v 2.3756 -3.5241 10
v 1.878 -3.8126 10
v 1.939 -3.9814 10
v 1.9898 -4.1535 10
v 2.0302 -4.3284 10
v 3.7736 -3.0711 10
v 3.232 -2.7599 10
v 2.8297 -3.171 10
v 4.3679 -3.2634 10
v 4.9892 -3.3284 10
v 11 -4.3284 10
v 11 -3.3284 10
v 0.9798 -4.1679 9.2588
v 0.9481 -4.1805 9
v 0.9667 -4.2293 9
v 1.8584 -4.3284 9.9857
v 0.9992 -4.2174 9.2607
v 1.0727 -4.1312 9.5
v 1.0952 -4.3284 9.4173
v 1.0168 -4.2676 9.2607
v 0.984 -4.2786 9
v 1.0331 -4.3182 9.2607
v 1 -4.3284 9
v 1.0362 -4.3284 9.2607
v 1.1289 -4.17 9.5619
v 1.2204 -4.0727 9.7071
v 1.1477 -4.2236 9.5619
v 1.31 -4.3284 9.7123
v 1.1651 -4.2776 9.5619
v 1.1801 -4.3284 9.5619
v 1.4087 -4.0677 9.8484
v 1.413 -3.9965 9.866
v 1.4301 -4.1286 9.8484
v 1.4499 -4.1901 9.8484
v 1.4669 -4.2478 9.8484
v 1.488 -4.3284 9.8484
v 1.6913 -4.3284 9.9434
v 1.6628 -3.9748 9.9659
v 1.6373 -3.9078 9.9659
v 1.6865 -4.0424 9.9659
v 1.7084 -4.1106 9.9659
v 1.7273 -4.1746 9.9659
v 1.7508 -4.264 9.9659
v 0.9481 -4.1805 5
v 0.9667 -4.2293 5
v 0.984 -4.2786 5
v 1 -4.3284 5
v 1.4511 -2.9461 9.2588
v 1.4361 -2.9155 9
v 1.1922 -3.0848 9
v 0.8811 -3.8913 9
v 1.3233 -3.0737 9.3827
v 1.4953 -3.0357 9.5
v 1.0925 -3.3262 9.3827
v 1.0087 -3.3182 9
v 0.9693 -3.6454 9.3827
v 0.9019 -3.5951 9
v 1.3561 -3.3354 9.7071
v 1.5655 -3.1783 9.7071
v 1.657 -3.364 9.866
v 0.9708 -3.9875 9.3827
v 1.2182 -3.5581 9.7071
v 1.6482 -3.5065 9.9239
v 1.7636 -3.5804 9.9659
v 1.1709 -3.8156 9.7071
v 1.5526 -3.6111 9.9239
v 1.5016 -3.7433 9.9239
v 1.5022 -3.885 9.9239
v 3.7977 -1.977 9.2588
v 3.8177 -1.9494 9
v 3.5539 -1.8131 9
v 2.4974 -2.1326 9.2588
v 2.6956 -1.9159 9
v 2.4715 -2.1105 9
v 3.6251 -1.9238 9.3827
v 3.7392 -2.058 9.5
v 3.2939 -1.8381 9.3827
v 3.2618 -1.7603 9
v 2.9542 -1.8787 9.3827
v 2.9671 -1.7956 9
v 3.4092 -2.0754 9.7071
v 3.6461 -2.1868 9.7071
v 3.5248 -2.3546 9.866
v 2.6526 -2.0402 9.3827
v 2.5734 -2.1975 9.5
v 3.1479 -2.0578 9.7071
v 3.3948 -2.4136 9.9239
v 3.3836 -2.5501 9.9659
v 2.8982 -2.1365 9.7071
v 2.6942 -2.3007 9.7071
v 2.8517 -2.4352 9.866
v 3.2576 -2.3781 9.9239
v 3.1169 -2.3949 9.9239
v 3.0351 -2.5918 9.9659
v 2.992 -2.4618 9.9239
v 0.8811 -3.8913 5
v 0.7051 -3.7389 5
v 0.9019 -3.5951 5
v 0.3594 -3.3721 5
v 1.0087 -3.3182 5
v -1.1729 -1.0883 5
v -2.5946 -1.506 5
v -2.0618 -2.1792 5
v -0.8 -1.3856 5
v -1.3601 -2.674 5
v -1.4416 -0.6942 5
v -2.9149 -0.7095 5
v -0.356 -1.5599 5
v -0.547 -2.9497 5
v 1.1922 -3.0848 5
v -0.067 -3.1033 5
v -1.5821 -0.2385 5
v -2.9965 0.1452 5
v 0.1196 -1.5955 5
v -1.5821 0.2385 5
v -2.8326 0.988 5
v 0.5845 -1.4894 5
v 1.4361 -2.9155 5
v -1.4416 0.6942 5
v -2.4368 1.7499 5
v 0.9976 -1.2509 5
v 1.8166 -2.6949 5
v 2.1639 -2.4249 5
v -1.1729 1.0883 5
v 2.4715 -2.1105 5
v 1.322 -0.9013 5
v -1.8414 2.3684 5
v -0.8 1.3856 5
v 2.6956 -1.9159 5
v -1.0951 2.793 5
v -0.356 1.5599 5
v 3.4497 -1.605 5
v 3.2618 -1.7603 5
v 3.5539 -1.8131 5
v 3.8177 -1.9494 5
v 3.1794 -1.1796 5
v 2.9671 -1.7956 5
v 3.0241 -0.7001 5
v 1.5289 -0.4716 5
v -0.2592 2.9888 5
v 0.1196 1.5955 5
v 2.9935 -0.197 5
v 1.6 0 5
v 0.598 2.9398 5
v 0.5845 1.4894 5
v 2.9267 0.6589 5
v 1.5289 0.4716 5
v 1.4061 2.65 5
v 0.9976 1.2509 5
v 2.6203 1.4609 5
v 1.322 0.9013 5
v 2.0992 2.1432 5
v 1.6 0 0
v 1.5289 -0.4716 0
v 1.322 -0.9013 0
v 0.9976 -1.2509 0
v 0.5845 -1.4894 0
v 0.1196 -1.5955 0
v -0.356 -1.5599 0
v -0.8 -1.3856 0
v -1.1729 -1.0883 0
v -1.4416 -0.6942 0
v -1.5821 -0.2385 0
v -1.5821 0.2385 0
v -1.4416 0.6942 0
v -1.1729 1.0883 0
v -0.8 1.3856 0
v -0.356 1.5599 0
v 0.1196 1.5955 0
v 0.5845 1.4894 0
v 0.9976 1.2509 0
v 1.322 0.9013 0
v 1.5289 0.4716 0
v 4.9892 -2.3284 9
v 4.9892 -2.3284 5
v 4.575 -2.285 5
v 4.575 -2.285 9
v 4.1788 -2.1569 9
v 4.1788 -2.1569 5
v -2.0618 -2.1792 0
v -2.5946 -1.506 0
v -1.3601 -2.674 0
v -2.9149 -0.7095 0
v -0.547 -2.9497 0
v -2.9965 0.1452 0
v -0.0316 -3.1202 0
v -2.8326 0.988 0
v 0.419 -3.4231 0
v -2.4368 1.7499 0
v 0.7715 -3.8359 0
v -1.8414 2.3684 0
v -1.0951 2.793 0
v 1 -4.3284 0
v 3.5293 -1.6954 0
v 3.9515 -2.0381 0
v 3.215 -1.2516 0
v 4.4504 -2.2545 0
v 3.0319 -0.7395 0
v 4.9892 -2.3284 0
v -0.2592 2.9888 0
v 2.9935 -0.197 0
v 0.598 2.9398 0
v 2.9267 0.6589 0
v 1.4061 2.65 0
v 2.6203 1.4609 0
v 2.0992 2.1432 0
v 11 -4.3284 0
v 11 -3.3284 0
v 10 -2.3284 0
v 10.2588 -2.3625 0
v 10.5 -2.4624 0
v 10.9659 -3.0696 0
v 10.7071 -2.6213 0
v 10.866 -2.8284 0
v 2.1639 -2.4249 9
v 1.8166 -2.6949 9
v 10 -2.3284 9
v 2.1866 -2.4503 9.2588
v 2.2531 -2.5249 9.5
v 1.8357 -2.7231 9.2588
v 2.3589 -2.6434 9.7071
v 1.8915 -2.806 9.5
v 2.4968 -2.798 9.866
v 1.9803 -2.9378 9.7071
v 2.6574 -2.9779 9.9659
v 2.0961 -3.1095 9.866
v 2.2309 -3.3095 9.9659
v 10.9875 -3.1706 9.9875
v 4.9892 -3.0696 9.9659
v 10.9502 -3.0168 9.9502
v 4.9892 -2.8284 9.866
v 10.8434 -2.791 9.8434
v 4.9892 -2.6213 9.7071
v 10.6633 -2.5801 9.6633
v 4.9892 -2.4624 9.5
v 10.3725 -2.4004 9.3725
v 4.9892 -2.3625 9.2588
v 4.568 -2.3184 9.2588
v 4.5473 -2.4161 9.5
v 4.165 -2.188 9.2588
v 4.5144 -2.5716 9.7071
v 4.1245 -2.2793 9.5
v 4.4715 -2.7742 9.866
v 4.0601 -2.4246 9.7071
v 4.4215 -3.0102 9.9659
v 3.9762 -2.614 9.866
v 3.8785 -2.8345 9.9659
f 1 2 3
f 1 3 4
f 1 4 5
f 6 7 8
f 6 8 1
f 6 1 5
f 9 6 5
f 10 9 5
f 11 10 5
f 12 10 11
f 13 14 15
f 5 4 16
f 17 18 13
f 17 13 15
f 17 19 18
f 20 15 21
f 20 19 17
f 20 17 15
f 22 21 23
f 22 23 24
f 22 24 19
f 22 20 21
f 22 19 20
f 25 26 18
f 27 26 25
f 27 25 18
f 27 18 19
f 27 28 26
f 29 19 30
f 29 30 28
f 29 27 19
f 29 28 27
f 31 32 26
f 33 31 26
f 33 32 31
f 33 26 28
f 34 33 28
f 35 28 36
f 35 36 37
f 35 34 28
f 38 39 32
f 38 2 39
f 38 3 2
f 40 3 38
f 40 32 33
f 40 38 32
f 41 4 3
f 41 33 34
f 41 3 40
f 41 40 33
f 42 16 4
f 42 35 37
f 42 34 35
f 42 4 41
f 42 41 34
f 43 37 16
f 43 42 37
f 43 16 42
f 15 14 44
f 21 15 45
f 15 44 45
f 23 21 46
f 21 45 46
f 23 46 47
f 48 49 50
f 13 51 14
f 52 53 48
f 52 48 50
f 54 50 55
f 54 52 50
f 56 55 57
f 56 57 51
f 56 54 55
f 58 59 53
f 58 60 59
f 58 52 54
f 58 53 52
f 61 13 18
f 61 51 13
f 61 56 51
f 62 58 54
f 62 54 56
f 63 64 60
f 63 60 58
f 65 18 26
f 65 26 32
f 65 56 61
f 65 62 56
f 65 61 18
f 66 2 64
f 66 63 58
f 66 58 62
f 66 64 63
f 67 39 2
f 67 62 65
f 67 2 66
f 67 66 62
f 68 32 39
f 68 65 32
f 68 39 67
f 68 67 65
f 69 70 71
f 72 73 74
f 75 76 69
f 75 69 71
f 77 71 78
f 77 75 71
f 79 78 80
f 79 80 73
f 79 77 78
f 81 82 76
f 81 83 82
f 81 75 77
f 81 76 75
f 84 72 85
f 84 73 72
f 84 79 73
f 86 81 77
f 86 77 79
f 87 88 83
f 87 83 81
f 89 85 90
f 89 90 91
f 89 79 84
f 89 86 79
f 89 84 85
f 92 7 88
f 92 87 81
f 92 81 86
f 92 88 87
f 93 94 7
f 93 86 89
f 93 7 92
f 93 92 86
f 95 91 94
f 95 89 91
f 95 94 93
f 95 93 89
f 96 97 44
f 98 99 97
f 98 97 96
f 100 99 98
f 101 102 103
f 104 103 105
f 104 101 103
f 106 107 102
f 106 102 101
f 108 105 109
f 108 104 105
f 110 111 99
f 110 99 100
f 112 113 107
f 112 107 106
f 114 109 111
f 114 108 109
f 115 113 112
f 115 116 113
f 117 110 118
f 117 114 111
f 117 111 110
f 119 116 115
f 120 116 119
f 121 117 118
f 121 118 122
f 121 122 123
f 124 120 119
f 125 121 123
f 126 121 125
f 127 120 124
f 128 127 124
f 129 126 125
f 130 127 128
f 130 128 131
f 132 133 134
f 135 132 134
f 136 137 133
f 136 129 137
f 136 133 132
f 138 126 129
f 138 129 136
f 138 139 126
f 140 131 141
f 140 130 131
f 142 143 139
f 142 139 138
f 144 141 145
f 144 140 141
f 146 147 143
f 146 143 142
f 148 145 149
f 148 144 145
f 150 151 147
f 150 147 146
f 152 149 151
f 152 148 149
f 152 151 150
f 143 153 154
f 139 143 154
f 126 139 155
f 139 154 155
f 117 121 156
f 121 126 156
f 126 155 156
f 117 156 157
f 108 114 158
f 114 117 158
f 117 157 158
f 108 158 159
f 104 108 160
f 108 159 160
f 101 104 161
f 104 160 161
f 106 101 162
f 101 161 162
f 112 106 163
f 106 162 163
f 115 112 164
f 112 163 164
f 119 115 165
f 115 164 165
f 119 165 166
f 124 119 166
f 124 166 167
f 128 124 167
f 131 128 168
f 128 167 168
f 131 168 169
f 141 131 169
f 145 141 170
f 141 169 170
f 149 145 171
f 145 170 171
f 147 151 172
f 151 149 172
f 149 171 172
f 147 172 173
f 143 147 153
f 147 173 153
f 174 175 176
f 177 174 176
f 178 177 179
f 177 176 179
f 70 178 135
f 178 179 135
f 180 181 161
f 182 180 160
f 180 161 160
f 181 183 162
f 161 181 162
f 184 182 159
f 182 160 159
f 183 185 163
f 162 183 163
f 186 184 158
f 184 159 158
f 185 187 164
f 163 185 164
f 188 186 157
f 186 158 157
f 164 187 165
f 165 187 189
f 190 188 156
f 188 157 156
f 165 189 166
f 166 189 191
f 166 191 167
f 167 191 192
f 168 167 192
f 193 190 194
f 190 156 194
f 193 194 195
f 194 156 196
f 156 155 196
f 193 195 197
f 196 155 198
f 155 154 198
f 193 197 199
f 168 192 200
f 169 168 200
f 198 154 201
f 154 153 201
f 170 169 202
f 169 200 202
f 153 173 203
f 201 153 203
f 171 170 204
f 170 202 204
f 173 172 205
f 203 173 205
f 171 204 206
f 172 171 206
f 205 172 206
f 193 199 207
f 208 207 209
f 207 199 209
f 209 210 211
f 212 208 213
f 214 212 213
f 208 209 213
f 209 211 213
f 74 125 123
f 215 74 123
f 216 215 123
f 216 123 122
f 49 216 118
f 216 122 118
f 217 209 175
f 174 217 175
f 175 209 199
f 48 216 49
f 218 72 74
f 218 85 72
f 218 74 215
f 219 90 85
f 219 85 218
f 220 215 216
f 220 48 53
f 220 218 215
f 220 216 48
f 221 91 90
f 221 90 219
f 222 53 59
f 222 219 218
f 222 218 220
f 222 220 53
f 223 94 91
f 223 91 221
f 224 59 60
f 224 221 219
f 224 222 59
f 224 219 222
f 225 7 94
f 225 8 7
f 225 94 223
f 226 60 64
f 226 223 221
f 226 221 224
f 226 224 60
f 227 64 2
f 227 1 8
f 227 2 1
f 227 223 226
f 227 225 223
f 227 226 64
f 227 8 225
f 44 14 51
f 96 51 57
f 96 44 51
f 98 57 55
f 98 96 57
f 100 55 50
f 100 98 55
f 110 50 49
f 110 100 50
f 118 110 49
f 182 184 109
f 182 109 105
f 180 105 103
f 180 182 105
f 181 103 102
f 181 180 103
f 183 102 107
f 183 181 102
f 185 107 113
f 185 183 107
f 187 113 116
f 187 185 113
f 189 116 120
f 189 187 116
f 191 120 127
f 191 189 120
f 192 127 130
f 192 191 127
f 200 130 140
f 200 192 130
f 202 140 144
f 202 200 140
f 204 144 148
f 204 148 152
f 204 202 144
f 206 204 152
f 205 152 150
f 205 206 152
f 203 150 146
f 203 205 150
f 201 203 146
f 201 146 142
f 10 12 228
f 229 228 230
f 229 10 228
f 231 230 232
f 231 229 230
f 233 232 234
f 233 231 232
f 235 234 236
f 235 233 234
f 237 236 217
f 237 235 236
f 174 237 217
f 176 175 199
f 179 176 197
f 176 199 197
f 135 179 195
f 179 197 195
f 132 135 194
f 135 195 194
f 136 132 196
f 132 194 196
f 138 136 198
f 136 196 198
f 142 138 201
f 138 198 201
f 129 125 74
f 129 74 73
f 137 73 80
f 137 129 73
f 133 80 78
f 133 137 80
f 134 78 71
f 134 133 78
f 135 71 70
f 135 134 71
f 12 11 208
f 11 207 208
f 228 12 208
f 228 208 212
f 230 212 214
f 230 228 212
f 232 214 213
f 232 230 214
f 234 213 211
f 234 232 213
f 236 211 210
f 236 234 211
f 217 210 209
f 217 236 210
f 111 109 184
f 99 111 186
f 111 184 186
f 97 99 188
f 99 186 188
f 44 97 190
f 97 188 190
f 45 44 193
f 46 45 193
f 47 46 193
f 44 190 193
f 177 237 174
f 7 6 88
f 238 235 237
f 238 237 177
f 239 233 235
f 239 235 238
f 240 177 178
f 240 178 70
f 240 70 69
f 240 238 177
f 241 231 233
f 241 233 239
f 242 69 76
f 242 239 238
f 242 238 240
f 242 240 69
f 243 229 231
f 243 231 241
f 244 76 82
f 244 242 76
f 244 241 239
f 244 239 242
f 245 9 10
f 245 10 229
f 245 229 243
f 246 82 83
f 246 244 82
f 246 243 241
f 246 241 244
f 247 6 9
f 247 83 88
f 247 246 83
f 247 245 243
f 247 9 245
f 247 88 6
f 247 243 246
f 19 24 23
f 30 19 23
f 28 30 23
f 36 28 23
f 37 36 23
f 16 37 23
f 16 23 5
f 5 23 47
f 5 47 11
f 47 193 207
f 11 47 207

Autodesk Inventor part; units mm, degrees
ref_plane "YZ Plane" through (0, 0, 0) normal (1, 0, 0) x (0, 1, 0)
ref_plane "XZ Plane" through (0, 0, 0) normal (0, 1, 0) x (-1, 0, 0)
ref_plane "XY Plane" through (0, 0, 0) normal (0, 0, 1) x (1, 0, 0)
sketch "Sketch1" plane through (0, 0, 0) normal (0, 0, 1) x (1, 0, 0)
  circle A0 centre (0, 0) radius 1.6
  circle A1 centre (0, 0) radius 3
  line L0 (1, -2.8284) -> (1, -4.3284)
  line L1 (1, -2.8284) -> (2.5, -2.8284) construction
  line L2 (1, -4.3284) -> (11, -4.3284)
  line L3 (11, -4.3284) -> (11, -2.3284)
  line L4 (11, -2.3284) -> (1.8917, -2.3284)
  dimension "d0" = 3.2
  dimension "d1" = 6
  dimension "d2" = 1.5
  dimension "d3" = 90
  dimension "d4" = 10
  dimension "d5" = 2
extrude "Extrusion1" add sketch "Sketch1" along normal blind 5
fillet "Fillet1" radius 2 2 edges at (1.8917, -2.3284, 2.5) (1, -2.8284, 2.5)
sketch "Sketch2" plane through (0, 0, 5) normal (0, 0, 1) x (1, 0, 0)
  circle A0 centre (0, 0) radius 1.6 projected
  circle A1 centre (0, 0) radius 3.25
  line L0 (11, -2.3284) -> (4.9892, -2.3284) projected
  arc A2 (2.9935, -0.1971) -> (4.9892, -2.3284) centre (4.9892, -0.3284) ccw projected
  arc A3 (2.9935, -0.1971) -> (-0.547, -2.9497) centre (0, 0) ccw projected
  arc A4 (1, -4.3284) -> (-0.547, -2.9497) centre (-0.9117, -4.9162) ccw projected
  line L1 (1, -4.3284) -> (11, -4.3284) projected
  line L2 (11, -4.3284) -> (11, -2.3284) projected
  circle A5 centre (0, 0) radius 1.6 projected
  point P0 (3.0985, -0.9806)
  point P1 (0.1865, -3.2446)
  dimension "d9" = 6.5
extrude "Extrusion2" add sketch "Sketch2" along normal blind 5 contours A1 A2 L0 L2 L1 A4
fillet "Fillet2" radius 1 2 edges at (3.0985, -0.9806, 7.5) (0.1865, -3.2446, 7.5)
fillet "Fillet3" radius 1 7 edges at (7.9946, -2.3284, 10) (4.3736, -2.2313, 10) (3.1131, -1.767, 10) (1.9948, -2.5658, 10) (0.945, -3.4526, 10) (0.9755, -4.2539, 10) (11, -2.3284, 5)
properties part number "zawias"
